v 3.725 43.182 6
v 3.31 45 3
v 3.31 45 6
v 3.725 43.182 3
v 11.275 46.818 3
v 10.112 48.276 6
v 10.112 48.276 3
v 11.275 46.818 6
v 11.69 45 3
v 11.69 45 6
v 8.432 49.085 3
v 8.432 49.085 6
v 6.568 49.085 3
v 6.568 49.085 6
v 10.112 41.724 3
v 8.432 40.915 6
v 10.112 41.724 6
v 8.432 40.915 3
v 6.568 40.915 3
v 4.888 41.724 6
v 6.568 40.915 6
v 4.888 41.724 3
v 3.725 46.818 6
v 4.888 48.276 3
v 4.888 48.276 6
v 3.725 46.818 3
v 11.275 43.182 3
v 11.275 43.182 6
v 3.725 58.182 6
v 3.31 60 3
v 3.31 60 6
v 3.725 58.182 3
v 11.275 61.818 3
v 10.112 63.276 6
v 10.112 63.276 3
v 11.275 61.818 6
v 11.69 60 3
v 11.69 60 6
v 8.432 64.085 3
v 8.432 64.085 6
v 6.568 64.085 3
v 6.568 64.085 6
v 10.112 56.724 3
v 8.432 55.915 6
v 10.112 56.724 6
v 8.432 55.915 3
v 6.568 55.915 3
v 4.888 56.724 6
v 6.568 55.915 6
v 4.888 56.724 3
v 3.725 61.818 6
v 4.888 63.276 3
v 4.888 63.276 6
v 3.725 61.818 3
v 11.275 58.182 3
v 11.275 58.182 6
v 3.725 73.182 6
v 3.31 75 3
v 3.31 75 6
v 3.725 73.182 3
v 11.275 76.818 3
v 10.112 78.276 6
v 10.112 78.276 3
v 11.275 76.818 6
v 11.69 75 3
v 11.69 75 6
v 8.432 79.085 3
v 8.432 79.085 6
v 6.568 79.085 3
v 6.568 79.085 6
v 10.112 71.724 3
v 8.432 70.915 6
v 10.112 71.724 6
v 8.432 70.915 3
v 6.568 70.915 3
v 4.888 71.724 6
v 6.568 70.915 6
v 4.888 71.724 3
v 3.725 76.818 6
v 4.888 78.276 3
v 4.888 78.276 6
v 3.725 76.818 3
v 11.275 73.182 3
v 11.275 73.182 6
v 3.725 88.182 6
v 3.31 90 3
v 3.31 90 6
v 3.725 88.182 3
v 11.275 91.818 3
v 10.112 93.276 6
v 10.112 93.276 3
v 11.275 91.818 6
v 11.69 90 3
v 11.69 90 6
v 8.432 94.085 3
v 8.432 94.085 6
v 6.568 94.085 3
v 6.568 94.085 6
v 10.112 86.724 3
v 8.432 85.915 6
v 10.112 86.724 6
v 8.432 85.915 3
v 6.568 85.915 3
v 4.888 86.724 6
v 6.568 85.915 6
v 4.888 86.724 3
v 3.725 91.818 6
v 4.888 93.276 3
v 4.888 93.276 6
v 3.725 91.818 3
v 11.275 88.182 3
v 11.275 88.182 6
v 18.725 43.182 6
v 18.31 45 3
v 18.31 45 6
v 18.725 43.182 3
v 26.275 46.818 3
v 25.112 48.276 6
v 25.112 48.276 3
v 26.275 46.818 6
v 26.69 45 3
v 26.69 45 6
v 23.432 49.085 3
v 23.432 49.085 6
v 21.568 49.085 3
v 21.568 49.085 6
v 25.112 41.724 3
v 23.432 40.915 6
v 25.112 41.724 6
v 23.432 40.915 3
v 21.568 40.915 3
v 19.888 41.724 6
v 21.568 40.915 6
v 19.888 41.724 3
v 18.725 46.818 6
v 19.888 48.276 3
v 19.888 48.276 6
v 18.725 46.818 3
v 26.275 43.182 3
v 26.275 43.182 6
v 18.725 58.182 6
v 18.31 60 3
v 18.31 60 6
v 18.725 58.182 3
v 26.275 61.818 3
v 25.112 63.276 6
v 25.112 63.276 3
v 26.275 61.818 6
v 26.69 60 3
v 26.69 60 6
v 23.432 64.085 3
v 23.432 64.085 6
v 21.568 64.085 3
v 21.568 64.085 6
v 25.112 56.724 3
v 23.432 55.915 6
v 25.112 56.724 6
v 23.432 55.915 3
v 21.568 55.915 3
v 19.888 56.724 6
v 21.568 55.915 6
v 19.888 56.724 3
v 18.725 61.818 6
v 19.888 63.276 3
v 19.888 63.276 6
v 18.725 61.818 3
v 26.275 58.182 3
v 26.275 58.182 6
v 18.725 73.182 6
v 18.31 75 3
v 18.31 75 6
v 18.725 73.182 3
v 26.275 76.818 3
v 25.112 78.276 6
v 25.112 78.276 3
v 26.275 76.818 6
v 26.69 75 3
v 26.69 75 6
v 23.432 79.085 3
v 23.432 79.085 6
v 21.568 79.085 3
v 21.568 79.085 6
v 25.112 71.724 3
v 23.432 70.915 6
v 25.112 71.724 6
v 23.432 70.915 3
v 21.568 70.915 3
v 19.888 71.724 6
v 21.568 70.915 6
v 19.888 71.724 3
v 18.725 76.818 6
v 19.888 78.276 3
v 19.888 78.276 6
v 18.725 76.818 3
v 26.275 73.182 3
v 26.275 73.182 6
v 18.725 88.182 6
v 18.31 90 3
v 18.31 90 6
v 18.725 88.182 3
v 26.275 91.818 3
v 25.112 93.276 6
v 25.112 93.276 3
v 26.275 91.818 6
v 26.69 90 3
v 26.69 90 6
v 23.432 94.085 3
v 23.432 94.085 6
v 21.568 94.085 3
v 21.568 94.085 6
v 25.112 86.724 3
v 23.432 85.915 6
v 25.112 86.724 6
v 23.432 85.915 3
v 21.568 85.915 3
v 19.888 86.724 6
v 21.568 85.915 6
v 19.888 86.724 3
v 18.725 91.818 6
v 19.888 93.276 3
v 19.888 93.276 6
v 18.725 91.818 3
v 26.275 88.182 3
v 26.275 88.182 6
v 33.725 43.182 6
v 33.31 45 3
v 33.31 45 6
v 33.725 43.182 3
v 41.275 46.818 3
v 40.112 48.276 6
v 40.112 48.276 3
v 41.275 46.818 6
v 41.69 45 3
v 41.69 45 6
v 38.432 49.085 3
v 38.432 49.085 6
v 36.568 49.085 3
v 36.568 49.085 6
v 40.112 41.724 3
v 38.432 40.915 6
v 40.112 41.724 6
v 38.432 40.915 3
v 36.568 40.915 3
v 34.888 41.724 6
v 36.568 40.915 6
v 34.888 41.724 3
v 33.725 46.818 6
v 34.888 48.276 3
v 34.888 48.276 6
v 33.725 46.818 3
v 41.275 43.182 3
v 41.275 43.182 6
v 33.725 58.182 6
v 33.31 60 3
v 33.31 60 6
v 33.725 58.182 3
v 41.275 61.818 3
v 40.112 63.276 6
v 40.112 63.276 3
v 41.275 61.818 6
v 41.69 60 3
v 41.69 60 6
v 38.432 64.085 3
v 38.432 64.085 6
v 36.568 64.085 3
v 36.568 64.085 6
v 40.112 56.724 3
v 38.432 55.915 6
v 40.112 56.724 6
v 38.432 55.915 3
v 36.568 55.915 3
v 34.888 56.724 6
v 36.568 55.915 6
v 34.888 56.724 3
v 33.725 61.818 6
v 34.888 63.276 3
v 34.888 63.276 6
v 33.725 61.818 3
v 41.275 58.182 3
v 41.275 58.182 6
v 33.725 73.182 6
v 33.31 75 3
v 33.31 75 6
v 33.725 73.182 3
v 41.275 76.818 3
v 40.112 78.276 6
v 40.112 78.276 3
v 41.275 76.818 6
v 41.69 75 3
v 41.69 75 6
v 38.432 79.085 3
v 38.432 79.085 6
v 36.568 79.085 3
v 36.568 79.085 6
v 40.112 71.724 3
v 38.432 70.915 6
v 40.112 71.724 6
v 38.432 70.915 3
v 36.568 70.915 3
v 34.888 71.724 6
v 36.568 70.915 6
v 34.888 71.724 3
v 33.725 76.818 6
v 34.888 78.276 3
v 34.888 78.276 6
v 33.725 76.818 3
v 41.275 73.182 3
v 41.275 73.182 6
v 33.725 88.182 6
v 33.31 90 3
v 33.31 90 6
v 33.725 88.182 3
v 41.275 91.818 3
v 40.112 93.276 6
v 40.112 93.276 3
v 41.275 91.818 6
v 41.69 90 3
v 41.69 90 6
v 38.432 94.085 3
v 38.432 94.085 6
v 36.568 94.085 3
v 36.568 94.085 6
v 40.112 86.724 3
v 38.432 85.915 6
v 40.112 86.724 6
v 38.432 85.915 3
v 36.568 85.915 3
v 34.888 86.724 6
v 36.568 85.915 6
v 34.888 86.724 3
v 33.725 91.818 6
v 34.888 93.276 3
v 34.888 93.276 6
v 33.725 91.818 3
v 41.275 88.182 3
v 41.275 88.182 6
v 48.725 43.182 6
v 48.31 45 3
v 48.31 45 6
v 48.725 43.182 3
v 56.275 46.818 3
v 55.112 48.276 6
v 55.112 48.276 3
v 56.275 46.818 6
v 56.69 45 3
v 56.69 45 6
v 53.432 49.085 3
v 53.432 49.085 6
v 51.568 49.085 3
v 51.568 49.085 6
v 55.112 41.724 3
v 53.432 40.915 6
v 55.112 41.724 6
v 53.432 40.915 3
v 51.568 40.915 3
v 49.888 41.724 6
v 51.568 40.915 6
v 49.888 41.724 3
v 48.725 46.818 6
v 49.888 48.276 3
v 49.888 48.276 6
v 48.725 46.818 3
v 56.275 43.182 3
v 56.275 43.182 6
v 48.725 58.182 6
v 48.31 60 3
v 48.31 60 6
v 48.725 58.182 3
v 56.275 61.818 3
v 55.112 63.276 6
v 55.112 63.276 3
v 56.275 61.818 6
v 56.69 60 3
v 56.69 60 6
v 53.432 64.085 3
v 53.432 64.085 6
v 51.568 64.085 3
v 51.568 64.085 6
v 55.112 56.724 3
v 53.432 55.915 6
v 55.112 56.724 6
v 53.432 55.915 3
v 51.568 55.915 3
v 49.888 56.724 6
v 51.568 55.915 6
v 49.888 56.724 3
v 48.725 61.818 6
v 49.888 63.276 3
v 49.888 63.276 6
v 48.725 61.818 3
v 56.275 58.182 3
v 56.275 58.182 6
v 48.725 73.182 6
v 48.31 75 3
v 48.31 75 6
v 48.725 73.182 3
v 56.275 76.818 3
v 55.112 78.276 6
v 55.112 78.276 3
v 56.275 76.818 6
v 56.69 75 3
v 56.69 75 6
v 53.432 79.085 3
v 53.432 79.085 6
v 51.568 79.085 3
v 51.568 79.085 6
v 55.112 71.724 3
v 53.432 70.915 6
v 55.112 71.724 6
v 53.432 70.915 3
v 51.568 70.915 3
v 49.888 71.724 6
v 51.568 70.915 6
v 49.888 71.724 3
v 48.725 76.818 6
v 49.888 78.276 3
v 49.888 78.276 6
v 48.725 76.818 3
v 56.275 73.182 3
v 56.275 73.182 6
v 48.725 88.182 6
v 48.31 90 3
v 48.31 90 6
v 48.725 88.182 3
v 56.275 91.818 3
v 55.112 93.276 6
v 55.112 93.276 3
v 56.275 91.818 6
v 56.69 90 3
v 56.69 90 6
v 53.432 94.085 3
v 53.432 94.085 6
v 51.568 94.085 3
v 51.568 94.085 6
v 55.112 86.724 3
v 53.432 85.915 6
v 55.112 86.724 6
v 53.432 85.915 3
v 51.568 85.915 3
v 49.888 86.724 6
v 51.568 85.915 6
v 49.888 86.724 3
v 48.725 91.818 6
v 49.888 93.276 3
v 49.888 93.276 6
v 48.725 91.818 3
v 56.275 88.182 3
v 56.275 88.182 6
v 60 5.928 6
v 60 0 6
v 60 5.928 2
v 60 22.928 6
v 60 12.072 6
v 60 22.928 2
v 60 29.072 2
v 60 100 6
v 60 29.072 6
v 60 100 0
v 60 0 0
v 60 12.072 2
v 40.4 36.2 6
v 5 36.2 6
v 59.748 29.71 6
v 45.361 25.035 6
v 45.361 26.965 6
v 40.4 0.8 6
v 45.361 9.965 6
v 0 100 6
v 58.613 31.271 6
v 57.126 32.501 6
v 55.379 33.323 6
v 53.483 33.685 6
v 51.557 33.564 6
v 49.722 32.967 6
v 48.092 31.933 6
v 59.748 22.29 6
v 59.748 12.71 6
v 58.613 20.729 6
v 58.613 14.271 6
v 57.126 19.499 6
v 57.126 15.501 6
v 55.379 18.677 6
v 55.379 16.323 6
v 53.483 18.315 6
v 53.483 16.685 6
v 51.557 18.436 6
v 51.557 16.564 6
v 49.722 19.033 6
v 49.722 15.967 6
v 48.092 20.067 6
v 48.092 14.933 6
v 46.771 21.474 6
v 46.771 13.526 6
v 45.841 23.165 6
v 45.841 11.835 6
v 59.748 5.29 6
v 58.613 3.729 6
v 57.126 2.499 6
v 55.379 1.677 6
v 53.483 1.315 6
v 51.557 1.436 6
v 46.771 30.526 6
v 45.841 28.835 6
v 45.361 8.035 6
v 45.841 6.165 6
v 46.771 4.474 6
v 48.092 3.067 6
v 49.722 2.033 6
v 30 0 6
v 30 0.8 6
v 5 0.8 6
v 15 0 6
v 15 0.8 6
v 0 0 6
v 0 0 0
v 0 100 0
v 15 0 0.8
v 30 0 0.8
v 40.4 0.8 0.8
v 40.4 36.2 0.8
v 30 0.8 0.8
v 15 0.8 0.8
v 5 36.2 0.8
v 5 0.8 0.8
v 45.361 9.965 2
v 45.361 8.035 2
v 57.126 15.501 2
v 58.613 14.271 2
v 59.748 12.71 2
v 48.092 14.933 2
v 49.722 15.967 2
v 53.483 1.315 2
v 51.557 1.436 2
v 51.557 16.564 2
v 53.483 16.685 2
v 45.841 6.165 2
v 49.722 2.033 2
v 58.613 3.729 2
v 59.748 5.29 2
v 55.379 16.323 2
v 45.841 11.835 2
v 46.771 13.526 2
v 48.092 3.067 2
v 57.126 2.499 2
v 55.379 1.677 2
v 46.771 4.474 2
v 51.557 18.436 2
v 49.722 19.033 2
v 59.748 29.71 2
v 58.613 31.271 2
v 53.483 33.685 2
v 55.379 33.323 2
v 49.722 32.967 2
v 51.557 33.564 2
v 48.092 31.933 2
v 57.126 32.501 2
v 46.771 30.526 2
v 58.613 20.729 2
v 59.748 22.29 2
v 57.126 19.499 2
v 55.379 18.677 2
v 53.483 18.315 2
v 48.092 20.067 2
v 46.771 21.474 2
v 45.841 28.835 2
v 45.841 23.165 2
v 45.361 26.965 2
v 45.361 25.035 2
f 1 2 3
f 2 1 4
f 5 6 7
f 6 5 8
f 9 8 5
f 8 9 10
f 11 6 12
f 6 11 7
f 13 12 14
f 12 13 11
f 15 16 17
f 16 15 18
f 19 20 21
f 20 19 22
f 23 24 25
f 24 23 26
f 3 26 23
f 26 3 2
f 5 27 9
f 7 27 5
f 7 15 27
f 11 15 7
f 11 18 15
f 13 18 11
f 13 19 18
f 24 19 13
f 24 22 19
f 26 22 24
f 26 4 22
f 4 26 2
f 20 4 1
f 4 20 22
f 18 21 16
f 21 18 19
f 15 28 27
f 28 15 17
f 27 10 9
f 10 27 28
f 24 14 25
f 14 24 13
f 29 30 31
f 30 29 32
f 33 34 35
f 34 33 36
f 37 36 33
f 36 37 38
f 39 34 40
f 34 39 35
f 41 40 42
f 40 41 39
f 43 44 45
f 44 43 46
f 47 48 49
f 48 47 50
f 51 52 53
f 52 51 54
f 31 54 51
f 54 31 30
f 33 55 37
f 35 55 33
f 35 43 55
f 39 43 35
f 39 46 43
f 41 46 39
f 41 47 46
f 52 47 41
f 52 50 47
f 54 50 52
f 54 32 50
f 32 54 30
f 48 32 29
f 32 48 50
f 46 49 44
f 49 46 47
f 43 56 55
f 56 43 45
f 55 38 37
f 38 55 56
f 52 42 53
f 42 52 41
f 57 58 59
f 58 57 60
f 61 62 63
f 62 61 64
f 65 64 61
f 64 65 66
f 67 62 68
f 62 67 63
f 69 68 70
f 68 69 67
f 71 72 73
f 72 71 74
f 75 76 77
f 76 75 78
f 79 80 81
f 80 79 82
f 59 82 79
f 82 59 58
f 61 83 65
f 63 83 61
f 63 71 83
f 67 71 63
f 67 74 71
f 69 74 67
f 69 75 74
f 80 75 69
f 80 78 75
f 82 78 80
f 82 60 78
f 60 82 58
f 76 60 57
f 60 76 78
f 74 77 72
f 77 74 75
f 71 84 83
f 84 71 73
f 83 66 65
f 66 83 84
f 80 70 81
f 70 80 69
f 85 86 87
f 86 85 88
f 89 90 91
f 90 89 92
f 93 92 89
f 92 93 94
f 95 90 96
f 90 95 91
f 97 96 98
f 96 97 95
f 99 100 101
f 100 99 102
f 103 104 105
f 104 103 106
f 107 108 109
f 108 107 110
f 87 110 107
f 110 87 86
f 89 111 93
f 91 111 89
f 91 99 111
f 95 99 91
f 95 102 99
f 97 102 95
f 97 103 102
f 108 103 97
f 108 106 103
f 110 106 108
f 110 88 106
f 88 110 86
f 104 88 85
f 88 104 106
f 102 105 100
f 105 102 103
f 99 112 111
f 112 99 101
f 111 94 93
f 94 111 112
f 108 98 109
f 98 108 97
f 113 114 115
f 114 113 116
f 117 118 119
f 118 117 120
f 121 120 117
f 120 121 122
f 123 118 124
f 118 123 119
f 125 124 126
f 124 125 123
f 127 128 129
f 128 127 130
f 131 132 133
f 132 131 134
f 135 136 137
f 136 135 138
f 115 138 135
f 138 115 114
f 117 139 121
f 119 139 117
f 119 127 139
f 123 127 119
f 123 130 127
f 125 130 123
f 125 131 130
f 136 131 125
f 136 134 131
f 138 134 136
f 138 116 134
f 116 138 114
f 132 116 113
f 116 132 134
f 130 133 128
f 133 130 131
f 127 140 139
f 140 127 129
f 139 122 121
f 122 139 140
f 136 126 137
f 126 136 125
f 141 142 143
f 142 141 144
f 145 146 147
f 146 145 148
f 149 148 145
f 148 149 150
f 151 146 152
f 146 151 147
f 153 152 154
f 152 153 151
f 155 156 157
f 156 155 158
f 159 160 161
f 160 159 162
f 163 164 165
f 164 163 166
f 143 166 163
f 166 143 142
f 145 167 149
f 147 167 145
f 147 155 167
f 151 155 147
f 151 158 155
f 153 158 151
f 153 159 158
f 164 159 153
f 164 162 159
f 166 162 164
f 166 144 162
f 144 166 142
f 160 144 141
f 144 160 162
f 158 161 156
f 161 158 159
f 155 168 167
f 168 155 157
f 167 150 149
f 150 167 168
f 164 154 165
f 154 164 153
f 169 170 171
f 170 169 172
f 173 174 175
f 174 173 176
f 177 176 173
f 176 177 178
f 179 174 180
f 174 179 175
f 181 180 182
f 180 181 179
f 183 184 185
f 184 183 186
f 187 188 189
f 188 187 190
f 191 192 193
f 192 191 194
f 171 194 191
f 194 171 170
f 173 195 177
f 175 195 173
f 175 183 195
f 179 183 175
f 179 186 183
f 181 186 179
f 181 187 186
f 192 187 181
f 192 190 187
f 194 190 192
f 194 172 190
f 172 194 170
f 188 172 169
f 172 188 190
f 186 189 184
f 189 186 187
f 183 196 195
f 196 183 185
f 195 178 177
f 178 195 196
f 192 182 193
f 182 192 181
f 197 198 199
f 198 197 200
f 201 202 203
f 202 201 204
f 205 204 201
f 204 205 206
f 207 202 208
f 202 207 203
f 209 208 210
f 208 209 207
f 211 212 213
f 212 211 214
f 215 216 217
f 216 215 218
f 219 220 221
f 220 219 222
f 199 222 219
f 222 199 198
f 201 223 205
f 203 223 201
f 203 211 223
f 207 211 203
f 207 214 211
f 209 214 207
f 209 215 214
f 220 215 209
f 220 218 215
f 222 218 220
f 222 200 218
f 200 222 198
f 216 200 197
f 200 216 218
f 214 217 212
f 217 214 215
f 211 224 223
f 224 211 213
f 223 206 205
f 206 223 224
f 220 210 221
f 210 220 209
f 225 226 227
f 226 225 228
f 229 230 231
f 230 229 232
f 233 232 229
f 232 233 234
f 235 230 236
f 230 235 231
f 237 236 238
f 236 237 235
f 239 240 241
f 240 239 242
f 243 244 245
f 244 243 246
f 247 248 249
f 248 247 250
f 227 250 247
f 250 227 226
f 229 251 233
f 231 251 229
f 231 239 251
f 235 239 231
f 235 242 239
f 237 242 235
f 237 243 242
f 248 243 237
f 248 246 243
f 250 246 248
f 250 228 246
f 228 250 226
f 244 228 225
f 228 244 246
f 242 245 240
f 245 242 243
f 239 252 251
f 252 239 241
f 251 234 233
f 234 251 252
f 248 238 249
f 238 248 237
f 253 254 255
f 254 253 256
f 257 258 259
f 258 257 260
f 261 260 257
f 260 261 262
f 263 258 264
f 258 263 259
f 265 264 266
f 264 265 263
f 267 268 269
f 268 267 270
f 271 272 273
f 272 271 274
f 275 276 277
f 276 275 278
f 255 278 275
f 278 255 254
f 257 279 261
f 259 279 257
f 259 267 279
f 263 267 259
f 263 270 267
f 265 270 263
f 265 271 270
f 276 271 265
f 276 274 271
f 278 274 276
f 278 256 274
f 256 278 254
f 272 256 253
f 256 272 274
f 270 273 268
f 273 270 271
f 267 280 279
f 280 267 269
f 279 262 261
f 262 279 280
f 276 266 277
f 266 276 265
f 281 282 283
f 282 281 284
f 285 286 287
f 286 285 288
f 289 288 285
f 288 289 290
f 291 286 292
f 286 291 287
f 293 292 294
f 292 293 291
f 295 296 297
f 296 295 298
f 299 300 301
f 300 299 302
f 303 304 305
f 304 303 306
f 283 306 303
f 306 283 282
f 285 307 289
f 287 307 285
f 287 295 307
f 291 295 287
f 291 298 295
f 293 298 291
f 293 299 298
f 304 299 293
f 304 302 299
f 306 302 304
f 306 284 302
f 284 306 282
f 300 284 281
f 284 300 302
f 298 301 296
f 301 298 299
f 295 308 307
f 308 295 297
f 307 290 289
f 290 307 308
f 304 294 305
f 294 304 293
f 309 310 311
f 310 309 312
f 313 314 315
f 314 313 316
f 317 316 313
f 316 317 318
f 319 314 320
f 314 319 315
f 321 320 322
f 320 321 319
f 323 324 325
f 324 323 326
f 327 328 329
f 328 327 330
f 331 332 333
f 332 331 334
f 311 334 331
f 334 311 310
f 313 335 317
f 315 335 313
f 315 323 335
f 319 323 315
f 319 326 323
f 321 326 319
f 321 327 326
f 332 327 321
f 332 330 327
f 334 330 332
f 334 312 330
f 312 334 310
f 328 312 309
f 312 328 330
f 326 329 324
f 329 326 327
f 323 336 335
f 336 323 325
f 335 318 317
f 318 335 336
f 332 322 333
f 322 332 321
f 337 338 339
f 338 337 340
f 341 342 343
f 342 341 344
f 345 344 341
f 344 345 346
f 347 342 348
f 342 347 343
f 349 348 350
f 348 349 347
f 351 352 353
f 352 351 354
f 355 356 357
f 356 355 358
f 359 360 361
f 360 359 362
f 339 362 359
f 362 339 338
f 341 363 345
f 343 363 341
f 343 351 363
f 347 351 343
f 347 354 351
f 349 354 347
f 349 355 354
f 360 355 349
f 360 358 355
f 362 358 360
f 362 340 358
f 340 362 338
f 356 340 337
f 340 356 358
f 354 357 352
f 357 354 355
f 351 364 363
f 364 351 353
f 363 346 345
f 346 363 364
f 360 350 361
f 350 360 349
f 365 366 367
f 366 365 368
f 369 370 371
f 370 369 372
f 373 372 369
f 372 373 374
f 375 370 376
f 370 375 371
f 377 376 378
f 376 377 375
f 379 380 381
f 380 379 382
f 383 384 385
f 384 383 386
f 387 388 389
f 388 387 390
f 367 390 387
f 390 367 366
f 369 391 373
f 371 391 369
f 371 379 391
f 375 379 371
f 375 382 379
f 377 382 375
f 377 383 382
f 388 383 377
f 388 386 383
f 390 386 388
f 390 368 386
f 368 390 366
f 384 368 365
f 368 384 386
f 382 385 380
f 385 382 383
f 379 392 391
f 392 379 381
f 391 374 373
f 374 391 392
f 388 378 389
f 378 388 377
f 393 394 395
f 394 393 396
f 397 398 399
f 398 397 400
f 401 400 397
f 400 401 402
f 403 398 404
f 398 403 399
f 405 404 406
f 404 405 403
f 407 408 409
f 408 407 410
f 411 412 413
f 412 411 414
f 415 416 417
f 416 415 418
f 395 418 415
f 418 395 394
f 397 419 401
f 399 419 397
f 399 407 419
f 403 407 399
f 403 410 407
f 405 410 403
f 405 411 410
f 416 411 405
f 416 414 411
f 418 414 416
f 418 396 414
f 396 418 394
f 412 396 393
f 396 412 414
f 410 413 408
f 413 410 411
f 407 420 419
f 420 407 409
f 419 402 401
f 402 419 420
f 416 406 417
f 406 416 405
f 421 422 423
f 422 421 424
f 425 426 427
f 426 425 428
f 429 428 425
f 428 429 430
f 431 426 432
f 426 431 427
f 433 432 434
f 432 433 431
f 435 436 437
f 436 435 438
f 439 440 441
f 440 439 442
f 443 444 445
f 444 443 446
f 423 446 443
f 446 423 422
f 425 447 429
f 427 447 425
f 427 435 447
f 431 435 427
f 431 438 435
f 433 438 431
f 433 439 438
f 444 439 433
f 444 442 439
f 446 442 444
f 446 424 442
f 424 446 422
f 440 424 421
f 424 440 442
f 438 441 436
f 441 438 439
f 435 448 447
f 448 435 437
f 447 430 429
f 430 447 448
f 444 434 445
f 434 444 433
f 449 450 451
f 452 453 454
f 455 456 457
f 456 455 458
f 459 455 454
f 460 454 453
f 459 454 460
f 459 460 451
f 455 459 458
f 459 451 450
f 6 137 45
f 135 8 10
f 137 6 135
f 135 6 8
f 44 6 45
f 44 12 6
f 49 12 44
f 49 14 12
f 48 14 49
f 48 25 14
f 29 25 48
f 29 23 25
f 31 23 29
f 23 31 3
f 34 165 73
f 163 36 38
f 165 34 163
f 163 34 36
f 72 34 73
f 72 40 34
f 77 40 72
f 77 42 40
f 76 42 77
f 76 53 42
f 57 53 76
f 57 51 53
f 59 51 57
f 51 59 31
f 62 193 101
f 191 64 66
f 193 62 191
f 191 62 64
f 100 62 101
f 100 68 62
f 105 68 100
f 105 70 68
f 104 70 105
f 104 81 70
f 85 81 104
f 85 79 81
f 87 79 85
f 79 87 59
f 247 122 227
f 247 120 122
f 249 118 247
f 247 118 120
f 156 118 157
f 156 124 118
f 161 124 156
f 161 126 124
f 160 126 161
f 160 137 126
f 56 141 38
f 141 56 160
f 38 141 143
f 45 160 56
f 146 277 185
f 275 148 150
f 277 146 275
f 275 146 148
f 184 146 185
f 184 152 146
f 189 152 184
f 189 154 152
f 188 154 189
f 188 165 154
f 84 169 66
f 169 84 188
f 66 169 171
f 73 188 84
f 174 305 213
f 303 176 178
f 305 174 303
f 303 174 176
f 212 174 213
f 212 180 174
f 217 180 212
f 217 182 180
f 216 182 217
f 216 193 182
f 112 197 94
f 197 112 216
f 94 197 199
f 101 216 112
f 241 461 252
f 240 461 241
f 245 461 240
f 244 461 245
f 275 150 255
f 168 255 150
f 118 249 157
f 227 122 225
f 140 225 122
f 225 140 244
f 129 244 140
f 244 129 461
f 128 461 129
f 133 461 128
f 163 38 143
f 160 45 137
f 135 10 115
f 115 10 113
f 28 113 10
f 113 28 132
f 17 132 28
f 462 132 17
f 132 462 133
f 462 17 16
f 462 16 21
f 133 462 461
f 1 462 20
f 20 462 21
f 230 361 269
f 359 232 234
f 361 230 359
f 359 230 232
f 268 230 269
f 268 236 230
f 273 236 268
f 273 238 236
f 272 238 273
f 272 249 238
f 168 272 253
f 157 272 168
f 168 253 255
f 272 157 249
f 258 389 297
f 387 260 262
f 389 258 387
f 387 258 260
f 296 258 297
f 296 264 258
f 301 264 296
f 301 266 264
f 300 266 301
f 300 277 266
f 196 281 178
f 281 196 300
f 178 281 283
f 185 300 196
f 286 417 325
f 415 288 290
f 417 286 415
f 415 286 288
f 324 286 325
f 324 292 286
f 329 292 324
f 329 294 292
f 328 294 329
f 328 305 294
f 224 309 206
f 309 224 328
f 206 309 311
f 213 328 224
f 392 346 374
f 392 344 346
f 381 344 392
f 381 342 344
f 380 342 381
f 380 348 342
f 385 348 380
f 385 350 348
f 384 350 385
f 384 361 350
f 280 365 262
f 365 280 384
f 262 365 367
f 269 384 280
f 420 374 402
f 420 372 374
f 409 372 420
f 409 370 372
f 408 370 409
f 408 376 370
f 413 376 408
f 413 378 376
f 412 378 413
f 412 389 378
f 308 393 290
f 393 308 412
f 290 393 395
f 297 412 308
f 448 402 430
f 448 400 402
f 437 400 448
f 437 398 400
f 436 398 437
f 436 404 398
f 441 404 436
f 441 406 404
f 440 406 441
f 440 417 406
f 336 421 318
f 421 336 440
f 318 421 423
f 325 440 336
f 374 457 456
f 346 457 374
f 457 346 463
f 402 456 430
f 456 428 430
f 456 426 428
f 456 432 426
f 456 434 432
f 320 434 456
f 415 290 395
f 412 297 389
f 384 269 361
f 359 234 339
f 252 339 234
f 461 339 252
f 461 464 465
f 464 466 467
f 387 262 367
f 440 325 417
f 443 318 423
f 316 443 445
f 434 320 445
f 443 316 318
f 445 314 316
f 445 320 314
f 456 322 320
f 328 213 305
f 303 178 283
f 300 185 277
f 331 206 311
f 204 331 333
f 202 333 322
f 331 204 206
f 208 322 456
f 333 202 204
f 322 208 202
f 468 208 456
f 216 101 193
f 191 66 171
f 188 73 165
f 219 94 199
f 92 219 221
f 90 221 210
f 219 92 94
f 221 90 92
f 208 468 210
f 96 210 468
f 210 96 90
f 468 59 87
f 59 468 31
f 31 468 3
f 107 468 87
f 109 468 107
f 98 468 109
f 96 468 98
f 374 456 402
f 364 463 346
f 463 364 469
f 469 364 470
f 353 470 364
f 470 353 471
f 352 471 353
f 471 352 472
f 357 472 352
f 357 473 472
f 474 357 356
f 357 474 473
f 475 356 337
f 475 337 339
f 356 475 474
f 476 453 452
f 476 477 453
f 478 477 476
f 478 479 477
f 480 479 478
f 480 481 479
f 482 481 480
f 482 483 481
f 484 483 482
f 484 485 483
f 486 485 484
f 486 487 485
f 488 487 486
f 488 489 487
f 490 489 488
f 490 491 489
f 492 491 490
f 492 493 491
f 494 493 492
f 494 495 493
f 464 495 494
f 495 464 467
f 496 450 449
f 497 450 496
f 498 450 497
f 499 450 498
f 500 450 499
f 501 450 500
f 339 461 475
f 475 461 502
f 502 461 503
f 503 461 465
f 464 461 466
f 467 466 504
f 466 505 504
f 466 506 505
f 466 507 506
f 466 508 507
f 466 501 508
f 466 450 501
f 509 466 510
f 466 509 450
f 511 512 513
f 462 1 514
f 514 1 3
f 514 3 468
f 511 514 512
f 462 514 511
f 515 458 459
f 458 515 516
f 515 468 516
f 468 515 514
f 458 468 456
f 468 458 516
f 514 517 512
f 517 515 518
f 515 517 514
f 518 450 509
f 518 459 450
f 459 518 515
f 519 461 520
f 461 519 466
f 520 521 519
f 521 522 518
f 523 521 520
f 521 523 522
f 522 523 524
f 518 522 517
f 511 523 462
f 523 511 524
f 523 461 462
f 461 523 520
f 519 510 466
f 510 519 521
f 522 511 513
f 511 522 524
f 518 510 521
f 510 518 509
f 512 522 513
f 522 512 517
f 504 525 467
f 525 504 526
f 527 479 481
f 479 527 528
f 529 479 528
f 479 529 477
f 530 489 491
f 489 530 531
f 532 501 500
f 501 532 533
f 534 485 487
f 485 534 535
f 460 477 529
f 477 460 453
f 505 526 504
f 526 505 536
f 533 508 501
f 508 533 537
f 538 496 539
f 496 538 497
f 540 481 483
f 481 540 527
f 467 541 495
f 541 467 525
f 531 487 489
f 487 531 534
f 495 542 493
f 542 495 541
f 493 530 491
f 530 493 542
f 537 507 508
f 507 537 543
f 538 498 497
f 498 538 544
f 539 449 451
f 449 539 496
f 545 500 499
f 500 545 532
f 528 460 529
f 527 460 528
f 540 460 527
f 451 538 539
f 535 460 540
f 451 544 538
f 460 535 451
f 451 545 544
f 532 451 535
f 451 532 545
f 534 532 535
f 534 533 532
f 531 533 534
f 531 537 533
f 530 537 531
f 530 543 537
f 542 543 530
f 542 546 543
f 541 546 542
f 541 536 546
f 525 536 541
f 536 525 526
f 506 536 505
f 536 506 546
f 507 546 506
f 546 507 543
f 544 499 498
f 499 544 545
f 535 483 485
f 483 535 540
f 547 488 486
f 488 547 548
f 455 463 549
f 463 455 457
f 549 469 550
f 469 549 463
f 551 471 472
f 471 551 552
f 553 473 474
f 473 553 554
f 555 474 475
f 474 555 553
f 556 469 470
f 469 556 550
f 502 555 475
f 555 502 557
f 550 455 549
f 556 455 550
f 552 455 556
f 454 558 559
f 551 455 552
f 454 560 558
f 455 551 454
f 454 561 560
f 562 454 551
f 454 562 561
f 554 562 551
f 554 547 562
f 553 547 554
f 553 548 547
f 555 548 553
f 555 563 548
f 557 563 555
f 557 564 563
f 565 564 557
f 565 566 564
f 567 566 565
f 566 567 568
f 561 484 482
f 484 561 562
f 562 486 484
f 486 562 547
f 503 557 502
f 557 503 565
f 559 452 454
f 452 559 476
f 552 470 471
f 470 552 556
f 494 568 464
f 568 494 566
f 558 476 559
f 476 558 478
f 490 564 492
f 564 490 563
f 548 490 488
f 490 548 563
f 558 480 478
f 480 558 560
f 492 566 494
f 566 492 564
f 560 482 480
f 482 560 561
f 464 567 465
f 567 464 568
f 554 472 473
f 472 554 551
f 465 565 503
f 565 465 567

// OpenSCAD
thick = 0.8;

module tray(width,height,depth,count) {
    difference() {
        cube([width*count+thick*(count+1),height+thick*2,depth+thick]);
        for (i=[0:count-1]) {
            translate([thick + (thick+width)*i,,thick,thick]) {
                cube([width,height,depth]);
                translate([width/2,-height,width/4]) 
                    rotate([-90,0,0]) 
                        cylinder(h=height*3,d=width/2);
                translate([width/4,-height,width/4]) 
                    cube([width/2,height*3,depth]);
            }
        }
    }
}

module playerTray() {
    discDiameter = 15.2 + 0.2; // tried 15.1 and 15.2, 15.2 was best
    robotDiameter = 7.9 + 0.04*12; // tried 0.04 increments between 7.9 and 8.1
    test = false;
    difference() {
        cube([60,100,6]);
        translate([5,thick,thick]) cube([35.4,35.4,6]);
        translate([15,0,thick]) cube([15,thick,6]);
        translate([53,9,2]) cylinder(h=4,d= test? 15.2 : discDiameter);
        translate([53,26,2]) cylinder(h=4,d=test? 15.1 : discDiameter);
        for (i=[0:3]) for (j=[0:3])
            translate([15*i+7.5,15*j+45,3])
                cylinder(h=5,d=test? 7.9+0.04 * (i+j*4) : robotDiameter);
        
    }
}
  
// tech tiles
// tray(35.6,35.6,31,4);

// tech cards
//tray(45,68,8,3);

playerTray();
